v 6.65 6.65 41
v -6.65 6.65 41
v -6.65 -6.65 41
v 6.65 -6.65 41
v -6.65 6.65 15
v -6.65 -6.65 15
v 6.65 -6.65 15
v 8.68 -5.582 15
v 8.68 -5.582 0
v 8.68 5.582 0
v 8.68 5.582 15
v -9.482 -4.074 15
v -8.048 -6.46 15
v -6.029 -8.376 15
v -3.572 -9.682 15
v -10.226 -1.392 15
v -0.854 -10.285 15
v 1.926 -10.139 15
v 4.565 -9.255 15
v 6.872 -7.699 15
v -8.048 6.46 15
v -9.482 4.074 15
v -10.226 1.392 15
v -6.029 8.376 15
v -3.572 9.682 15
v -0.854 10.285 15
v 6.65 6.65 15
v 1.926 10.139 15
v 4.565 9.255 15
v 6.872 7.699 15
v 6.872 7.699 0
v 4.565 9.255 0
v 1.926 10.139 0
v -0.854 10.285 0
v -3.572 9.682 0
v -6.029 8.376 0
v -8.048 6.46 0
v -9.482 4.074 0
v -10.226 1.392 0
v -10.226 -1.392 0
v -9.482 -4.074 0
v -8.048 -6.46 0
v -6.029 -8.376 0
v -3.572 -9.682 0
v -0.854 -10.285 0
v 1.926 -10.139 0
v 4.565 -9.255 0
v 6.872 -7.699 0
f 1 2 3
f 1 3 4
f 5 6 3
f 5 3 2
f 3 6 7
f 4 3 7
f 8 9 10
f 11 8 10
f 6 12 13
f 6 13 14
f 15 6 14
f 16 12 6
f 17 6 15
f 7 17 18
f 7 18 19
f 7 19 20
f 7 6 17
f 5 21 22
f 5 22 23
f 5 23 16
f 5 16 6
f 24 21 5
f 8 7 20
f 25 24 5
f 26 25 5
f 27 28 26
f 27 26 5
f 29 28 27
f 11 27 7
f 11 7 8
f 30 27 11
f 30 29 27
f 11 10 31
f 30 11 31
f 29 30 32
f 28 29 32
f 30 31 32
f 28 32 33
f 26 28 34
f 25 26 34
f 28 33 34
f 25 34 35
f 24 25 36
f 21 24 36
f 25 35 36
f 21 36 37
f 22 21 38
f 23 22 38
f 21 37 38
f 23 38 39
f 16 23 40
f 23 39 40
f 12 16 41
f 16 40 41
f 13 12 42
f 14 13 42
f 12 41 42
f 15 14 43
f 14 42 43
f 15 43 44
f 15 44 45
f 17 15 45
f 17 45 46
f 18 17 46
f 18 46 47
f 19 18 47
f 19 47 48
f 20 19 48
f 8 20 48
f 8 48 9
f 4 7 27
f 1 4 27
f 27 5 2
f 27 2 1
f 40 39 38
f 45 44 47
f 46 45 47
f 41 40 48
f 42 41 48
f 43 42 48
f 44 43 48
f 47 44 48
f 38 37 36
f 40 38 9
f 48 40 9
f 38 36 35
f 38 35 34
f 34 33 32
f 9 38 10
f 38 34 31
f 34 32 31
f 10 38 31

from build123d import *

# Parameters (mm, degrees)
F1_DEPTH = 15
F2_W     = 13.3
F2_H     = 13.3
F3_DEPTH = 26


with BuildPart() as f1:
    # F0 (on Top) → F1 (new body)
    with BuildSketch(Plane.XY):
        with BuildLine():
            Line((8.68, -5.582114), (8.68, 5.582114))
            ThreePointArc((8.68, 5.582114), (-10.32, 0), (8.68, -5.582114))
        make_face()
    extrude(amount=F1_DEPTH)

    # F2 (on face) → F3 (join)
    with BuildSketch(Plane.XY.offset(15)):
        Rectangle(F2_W, F2_H)
    extrude(amount=F3_DEPTH)


solid = f1.part
